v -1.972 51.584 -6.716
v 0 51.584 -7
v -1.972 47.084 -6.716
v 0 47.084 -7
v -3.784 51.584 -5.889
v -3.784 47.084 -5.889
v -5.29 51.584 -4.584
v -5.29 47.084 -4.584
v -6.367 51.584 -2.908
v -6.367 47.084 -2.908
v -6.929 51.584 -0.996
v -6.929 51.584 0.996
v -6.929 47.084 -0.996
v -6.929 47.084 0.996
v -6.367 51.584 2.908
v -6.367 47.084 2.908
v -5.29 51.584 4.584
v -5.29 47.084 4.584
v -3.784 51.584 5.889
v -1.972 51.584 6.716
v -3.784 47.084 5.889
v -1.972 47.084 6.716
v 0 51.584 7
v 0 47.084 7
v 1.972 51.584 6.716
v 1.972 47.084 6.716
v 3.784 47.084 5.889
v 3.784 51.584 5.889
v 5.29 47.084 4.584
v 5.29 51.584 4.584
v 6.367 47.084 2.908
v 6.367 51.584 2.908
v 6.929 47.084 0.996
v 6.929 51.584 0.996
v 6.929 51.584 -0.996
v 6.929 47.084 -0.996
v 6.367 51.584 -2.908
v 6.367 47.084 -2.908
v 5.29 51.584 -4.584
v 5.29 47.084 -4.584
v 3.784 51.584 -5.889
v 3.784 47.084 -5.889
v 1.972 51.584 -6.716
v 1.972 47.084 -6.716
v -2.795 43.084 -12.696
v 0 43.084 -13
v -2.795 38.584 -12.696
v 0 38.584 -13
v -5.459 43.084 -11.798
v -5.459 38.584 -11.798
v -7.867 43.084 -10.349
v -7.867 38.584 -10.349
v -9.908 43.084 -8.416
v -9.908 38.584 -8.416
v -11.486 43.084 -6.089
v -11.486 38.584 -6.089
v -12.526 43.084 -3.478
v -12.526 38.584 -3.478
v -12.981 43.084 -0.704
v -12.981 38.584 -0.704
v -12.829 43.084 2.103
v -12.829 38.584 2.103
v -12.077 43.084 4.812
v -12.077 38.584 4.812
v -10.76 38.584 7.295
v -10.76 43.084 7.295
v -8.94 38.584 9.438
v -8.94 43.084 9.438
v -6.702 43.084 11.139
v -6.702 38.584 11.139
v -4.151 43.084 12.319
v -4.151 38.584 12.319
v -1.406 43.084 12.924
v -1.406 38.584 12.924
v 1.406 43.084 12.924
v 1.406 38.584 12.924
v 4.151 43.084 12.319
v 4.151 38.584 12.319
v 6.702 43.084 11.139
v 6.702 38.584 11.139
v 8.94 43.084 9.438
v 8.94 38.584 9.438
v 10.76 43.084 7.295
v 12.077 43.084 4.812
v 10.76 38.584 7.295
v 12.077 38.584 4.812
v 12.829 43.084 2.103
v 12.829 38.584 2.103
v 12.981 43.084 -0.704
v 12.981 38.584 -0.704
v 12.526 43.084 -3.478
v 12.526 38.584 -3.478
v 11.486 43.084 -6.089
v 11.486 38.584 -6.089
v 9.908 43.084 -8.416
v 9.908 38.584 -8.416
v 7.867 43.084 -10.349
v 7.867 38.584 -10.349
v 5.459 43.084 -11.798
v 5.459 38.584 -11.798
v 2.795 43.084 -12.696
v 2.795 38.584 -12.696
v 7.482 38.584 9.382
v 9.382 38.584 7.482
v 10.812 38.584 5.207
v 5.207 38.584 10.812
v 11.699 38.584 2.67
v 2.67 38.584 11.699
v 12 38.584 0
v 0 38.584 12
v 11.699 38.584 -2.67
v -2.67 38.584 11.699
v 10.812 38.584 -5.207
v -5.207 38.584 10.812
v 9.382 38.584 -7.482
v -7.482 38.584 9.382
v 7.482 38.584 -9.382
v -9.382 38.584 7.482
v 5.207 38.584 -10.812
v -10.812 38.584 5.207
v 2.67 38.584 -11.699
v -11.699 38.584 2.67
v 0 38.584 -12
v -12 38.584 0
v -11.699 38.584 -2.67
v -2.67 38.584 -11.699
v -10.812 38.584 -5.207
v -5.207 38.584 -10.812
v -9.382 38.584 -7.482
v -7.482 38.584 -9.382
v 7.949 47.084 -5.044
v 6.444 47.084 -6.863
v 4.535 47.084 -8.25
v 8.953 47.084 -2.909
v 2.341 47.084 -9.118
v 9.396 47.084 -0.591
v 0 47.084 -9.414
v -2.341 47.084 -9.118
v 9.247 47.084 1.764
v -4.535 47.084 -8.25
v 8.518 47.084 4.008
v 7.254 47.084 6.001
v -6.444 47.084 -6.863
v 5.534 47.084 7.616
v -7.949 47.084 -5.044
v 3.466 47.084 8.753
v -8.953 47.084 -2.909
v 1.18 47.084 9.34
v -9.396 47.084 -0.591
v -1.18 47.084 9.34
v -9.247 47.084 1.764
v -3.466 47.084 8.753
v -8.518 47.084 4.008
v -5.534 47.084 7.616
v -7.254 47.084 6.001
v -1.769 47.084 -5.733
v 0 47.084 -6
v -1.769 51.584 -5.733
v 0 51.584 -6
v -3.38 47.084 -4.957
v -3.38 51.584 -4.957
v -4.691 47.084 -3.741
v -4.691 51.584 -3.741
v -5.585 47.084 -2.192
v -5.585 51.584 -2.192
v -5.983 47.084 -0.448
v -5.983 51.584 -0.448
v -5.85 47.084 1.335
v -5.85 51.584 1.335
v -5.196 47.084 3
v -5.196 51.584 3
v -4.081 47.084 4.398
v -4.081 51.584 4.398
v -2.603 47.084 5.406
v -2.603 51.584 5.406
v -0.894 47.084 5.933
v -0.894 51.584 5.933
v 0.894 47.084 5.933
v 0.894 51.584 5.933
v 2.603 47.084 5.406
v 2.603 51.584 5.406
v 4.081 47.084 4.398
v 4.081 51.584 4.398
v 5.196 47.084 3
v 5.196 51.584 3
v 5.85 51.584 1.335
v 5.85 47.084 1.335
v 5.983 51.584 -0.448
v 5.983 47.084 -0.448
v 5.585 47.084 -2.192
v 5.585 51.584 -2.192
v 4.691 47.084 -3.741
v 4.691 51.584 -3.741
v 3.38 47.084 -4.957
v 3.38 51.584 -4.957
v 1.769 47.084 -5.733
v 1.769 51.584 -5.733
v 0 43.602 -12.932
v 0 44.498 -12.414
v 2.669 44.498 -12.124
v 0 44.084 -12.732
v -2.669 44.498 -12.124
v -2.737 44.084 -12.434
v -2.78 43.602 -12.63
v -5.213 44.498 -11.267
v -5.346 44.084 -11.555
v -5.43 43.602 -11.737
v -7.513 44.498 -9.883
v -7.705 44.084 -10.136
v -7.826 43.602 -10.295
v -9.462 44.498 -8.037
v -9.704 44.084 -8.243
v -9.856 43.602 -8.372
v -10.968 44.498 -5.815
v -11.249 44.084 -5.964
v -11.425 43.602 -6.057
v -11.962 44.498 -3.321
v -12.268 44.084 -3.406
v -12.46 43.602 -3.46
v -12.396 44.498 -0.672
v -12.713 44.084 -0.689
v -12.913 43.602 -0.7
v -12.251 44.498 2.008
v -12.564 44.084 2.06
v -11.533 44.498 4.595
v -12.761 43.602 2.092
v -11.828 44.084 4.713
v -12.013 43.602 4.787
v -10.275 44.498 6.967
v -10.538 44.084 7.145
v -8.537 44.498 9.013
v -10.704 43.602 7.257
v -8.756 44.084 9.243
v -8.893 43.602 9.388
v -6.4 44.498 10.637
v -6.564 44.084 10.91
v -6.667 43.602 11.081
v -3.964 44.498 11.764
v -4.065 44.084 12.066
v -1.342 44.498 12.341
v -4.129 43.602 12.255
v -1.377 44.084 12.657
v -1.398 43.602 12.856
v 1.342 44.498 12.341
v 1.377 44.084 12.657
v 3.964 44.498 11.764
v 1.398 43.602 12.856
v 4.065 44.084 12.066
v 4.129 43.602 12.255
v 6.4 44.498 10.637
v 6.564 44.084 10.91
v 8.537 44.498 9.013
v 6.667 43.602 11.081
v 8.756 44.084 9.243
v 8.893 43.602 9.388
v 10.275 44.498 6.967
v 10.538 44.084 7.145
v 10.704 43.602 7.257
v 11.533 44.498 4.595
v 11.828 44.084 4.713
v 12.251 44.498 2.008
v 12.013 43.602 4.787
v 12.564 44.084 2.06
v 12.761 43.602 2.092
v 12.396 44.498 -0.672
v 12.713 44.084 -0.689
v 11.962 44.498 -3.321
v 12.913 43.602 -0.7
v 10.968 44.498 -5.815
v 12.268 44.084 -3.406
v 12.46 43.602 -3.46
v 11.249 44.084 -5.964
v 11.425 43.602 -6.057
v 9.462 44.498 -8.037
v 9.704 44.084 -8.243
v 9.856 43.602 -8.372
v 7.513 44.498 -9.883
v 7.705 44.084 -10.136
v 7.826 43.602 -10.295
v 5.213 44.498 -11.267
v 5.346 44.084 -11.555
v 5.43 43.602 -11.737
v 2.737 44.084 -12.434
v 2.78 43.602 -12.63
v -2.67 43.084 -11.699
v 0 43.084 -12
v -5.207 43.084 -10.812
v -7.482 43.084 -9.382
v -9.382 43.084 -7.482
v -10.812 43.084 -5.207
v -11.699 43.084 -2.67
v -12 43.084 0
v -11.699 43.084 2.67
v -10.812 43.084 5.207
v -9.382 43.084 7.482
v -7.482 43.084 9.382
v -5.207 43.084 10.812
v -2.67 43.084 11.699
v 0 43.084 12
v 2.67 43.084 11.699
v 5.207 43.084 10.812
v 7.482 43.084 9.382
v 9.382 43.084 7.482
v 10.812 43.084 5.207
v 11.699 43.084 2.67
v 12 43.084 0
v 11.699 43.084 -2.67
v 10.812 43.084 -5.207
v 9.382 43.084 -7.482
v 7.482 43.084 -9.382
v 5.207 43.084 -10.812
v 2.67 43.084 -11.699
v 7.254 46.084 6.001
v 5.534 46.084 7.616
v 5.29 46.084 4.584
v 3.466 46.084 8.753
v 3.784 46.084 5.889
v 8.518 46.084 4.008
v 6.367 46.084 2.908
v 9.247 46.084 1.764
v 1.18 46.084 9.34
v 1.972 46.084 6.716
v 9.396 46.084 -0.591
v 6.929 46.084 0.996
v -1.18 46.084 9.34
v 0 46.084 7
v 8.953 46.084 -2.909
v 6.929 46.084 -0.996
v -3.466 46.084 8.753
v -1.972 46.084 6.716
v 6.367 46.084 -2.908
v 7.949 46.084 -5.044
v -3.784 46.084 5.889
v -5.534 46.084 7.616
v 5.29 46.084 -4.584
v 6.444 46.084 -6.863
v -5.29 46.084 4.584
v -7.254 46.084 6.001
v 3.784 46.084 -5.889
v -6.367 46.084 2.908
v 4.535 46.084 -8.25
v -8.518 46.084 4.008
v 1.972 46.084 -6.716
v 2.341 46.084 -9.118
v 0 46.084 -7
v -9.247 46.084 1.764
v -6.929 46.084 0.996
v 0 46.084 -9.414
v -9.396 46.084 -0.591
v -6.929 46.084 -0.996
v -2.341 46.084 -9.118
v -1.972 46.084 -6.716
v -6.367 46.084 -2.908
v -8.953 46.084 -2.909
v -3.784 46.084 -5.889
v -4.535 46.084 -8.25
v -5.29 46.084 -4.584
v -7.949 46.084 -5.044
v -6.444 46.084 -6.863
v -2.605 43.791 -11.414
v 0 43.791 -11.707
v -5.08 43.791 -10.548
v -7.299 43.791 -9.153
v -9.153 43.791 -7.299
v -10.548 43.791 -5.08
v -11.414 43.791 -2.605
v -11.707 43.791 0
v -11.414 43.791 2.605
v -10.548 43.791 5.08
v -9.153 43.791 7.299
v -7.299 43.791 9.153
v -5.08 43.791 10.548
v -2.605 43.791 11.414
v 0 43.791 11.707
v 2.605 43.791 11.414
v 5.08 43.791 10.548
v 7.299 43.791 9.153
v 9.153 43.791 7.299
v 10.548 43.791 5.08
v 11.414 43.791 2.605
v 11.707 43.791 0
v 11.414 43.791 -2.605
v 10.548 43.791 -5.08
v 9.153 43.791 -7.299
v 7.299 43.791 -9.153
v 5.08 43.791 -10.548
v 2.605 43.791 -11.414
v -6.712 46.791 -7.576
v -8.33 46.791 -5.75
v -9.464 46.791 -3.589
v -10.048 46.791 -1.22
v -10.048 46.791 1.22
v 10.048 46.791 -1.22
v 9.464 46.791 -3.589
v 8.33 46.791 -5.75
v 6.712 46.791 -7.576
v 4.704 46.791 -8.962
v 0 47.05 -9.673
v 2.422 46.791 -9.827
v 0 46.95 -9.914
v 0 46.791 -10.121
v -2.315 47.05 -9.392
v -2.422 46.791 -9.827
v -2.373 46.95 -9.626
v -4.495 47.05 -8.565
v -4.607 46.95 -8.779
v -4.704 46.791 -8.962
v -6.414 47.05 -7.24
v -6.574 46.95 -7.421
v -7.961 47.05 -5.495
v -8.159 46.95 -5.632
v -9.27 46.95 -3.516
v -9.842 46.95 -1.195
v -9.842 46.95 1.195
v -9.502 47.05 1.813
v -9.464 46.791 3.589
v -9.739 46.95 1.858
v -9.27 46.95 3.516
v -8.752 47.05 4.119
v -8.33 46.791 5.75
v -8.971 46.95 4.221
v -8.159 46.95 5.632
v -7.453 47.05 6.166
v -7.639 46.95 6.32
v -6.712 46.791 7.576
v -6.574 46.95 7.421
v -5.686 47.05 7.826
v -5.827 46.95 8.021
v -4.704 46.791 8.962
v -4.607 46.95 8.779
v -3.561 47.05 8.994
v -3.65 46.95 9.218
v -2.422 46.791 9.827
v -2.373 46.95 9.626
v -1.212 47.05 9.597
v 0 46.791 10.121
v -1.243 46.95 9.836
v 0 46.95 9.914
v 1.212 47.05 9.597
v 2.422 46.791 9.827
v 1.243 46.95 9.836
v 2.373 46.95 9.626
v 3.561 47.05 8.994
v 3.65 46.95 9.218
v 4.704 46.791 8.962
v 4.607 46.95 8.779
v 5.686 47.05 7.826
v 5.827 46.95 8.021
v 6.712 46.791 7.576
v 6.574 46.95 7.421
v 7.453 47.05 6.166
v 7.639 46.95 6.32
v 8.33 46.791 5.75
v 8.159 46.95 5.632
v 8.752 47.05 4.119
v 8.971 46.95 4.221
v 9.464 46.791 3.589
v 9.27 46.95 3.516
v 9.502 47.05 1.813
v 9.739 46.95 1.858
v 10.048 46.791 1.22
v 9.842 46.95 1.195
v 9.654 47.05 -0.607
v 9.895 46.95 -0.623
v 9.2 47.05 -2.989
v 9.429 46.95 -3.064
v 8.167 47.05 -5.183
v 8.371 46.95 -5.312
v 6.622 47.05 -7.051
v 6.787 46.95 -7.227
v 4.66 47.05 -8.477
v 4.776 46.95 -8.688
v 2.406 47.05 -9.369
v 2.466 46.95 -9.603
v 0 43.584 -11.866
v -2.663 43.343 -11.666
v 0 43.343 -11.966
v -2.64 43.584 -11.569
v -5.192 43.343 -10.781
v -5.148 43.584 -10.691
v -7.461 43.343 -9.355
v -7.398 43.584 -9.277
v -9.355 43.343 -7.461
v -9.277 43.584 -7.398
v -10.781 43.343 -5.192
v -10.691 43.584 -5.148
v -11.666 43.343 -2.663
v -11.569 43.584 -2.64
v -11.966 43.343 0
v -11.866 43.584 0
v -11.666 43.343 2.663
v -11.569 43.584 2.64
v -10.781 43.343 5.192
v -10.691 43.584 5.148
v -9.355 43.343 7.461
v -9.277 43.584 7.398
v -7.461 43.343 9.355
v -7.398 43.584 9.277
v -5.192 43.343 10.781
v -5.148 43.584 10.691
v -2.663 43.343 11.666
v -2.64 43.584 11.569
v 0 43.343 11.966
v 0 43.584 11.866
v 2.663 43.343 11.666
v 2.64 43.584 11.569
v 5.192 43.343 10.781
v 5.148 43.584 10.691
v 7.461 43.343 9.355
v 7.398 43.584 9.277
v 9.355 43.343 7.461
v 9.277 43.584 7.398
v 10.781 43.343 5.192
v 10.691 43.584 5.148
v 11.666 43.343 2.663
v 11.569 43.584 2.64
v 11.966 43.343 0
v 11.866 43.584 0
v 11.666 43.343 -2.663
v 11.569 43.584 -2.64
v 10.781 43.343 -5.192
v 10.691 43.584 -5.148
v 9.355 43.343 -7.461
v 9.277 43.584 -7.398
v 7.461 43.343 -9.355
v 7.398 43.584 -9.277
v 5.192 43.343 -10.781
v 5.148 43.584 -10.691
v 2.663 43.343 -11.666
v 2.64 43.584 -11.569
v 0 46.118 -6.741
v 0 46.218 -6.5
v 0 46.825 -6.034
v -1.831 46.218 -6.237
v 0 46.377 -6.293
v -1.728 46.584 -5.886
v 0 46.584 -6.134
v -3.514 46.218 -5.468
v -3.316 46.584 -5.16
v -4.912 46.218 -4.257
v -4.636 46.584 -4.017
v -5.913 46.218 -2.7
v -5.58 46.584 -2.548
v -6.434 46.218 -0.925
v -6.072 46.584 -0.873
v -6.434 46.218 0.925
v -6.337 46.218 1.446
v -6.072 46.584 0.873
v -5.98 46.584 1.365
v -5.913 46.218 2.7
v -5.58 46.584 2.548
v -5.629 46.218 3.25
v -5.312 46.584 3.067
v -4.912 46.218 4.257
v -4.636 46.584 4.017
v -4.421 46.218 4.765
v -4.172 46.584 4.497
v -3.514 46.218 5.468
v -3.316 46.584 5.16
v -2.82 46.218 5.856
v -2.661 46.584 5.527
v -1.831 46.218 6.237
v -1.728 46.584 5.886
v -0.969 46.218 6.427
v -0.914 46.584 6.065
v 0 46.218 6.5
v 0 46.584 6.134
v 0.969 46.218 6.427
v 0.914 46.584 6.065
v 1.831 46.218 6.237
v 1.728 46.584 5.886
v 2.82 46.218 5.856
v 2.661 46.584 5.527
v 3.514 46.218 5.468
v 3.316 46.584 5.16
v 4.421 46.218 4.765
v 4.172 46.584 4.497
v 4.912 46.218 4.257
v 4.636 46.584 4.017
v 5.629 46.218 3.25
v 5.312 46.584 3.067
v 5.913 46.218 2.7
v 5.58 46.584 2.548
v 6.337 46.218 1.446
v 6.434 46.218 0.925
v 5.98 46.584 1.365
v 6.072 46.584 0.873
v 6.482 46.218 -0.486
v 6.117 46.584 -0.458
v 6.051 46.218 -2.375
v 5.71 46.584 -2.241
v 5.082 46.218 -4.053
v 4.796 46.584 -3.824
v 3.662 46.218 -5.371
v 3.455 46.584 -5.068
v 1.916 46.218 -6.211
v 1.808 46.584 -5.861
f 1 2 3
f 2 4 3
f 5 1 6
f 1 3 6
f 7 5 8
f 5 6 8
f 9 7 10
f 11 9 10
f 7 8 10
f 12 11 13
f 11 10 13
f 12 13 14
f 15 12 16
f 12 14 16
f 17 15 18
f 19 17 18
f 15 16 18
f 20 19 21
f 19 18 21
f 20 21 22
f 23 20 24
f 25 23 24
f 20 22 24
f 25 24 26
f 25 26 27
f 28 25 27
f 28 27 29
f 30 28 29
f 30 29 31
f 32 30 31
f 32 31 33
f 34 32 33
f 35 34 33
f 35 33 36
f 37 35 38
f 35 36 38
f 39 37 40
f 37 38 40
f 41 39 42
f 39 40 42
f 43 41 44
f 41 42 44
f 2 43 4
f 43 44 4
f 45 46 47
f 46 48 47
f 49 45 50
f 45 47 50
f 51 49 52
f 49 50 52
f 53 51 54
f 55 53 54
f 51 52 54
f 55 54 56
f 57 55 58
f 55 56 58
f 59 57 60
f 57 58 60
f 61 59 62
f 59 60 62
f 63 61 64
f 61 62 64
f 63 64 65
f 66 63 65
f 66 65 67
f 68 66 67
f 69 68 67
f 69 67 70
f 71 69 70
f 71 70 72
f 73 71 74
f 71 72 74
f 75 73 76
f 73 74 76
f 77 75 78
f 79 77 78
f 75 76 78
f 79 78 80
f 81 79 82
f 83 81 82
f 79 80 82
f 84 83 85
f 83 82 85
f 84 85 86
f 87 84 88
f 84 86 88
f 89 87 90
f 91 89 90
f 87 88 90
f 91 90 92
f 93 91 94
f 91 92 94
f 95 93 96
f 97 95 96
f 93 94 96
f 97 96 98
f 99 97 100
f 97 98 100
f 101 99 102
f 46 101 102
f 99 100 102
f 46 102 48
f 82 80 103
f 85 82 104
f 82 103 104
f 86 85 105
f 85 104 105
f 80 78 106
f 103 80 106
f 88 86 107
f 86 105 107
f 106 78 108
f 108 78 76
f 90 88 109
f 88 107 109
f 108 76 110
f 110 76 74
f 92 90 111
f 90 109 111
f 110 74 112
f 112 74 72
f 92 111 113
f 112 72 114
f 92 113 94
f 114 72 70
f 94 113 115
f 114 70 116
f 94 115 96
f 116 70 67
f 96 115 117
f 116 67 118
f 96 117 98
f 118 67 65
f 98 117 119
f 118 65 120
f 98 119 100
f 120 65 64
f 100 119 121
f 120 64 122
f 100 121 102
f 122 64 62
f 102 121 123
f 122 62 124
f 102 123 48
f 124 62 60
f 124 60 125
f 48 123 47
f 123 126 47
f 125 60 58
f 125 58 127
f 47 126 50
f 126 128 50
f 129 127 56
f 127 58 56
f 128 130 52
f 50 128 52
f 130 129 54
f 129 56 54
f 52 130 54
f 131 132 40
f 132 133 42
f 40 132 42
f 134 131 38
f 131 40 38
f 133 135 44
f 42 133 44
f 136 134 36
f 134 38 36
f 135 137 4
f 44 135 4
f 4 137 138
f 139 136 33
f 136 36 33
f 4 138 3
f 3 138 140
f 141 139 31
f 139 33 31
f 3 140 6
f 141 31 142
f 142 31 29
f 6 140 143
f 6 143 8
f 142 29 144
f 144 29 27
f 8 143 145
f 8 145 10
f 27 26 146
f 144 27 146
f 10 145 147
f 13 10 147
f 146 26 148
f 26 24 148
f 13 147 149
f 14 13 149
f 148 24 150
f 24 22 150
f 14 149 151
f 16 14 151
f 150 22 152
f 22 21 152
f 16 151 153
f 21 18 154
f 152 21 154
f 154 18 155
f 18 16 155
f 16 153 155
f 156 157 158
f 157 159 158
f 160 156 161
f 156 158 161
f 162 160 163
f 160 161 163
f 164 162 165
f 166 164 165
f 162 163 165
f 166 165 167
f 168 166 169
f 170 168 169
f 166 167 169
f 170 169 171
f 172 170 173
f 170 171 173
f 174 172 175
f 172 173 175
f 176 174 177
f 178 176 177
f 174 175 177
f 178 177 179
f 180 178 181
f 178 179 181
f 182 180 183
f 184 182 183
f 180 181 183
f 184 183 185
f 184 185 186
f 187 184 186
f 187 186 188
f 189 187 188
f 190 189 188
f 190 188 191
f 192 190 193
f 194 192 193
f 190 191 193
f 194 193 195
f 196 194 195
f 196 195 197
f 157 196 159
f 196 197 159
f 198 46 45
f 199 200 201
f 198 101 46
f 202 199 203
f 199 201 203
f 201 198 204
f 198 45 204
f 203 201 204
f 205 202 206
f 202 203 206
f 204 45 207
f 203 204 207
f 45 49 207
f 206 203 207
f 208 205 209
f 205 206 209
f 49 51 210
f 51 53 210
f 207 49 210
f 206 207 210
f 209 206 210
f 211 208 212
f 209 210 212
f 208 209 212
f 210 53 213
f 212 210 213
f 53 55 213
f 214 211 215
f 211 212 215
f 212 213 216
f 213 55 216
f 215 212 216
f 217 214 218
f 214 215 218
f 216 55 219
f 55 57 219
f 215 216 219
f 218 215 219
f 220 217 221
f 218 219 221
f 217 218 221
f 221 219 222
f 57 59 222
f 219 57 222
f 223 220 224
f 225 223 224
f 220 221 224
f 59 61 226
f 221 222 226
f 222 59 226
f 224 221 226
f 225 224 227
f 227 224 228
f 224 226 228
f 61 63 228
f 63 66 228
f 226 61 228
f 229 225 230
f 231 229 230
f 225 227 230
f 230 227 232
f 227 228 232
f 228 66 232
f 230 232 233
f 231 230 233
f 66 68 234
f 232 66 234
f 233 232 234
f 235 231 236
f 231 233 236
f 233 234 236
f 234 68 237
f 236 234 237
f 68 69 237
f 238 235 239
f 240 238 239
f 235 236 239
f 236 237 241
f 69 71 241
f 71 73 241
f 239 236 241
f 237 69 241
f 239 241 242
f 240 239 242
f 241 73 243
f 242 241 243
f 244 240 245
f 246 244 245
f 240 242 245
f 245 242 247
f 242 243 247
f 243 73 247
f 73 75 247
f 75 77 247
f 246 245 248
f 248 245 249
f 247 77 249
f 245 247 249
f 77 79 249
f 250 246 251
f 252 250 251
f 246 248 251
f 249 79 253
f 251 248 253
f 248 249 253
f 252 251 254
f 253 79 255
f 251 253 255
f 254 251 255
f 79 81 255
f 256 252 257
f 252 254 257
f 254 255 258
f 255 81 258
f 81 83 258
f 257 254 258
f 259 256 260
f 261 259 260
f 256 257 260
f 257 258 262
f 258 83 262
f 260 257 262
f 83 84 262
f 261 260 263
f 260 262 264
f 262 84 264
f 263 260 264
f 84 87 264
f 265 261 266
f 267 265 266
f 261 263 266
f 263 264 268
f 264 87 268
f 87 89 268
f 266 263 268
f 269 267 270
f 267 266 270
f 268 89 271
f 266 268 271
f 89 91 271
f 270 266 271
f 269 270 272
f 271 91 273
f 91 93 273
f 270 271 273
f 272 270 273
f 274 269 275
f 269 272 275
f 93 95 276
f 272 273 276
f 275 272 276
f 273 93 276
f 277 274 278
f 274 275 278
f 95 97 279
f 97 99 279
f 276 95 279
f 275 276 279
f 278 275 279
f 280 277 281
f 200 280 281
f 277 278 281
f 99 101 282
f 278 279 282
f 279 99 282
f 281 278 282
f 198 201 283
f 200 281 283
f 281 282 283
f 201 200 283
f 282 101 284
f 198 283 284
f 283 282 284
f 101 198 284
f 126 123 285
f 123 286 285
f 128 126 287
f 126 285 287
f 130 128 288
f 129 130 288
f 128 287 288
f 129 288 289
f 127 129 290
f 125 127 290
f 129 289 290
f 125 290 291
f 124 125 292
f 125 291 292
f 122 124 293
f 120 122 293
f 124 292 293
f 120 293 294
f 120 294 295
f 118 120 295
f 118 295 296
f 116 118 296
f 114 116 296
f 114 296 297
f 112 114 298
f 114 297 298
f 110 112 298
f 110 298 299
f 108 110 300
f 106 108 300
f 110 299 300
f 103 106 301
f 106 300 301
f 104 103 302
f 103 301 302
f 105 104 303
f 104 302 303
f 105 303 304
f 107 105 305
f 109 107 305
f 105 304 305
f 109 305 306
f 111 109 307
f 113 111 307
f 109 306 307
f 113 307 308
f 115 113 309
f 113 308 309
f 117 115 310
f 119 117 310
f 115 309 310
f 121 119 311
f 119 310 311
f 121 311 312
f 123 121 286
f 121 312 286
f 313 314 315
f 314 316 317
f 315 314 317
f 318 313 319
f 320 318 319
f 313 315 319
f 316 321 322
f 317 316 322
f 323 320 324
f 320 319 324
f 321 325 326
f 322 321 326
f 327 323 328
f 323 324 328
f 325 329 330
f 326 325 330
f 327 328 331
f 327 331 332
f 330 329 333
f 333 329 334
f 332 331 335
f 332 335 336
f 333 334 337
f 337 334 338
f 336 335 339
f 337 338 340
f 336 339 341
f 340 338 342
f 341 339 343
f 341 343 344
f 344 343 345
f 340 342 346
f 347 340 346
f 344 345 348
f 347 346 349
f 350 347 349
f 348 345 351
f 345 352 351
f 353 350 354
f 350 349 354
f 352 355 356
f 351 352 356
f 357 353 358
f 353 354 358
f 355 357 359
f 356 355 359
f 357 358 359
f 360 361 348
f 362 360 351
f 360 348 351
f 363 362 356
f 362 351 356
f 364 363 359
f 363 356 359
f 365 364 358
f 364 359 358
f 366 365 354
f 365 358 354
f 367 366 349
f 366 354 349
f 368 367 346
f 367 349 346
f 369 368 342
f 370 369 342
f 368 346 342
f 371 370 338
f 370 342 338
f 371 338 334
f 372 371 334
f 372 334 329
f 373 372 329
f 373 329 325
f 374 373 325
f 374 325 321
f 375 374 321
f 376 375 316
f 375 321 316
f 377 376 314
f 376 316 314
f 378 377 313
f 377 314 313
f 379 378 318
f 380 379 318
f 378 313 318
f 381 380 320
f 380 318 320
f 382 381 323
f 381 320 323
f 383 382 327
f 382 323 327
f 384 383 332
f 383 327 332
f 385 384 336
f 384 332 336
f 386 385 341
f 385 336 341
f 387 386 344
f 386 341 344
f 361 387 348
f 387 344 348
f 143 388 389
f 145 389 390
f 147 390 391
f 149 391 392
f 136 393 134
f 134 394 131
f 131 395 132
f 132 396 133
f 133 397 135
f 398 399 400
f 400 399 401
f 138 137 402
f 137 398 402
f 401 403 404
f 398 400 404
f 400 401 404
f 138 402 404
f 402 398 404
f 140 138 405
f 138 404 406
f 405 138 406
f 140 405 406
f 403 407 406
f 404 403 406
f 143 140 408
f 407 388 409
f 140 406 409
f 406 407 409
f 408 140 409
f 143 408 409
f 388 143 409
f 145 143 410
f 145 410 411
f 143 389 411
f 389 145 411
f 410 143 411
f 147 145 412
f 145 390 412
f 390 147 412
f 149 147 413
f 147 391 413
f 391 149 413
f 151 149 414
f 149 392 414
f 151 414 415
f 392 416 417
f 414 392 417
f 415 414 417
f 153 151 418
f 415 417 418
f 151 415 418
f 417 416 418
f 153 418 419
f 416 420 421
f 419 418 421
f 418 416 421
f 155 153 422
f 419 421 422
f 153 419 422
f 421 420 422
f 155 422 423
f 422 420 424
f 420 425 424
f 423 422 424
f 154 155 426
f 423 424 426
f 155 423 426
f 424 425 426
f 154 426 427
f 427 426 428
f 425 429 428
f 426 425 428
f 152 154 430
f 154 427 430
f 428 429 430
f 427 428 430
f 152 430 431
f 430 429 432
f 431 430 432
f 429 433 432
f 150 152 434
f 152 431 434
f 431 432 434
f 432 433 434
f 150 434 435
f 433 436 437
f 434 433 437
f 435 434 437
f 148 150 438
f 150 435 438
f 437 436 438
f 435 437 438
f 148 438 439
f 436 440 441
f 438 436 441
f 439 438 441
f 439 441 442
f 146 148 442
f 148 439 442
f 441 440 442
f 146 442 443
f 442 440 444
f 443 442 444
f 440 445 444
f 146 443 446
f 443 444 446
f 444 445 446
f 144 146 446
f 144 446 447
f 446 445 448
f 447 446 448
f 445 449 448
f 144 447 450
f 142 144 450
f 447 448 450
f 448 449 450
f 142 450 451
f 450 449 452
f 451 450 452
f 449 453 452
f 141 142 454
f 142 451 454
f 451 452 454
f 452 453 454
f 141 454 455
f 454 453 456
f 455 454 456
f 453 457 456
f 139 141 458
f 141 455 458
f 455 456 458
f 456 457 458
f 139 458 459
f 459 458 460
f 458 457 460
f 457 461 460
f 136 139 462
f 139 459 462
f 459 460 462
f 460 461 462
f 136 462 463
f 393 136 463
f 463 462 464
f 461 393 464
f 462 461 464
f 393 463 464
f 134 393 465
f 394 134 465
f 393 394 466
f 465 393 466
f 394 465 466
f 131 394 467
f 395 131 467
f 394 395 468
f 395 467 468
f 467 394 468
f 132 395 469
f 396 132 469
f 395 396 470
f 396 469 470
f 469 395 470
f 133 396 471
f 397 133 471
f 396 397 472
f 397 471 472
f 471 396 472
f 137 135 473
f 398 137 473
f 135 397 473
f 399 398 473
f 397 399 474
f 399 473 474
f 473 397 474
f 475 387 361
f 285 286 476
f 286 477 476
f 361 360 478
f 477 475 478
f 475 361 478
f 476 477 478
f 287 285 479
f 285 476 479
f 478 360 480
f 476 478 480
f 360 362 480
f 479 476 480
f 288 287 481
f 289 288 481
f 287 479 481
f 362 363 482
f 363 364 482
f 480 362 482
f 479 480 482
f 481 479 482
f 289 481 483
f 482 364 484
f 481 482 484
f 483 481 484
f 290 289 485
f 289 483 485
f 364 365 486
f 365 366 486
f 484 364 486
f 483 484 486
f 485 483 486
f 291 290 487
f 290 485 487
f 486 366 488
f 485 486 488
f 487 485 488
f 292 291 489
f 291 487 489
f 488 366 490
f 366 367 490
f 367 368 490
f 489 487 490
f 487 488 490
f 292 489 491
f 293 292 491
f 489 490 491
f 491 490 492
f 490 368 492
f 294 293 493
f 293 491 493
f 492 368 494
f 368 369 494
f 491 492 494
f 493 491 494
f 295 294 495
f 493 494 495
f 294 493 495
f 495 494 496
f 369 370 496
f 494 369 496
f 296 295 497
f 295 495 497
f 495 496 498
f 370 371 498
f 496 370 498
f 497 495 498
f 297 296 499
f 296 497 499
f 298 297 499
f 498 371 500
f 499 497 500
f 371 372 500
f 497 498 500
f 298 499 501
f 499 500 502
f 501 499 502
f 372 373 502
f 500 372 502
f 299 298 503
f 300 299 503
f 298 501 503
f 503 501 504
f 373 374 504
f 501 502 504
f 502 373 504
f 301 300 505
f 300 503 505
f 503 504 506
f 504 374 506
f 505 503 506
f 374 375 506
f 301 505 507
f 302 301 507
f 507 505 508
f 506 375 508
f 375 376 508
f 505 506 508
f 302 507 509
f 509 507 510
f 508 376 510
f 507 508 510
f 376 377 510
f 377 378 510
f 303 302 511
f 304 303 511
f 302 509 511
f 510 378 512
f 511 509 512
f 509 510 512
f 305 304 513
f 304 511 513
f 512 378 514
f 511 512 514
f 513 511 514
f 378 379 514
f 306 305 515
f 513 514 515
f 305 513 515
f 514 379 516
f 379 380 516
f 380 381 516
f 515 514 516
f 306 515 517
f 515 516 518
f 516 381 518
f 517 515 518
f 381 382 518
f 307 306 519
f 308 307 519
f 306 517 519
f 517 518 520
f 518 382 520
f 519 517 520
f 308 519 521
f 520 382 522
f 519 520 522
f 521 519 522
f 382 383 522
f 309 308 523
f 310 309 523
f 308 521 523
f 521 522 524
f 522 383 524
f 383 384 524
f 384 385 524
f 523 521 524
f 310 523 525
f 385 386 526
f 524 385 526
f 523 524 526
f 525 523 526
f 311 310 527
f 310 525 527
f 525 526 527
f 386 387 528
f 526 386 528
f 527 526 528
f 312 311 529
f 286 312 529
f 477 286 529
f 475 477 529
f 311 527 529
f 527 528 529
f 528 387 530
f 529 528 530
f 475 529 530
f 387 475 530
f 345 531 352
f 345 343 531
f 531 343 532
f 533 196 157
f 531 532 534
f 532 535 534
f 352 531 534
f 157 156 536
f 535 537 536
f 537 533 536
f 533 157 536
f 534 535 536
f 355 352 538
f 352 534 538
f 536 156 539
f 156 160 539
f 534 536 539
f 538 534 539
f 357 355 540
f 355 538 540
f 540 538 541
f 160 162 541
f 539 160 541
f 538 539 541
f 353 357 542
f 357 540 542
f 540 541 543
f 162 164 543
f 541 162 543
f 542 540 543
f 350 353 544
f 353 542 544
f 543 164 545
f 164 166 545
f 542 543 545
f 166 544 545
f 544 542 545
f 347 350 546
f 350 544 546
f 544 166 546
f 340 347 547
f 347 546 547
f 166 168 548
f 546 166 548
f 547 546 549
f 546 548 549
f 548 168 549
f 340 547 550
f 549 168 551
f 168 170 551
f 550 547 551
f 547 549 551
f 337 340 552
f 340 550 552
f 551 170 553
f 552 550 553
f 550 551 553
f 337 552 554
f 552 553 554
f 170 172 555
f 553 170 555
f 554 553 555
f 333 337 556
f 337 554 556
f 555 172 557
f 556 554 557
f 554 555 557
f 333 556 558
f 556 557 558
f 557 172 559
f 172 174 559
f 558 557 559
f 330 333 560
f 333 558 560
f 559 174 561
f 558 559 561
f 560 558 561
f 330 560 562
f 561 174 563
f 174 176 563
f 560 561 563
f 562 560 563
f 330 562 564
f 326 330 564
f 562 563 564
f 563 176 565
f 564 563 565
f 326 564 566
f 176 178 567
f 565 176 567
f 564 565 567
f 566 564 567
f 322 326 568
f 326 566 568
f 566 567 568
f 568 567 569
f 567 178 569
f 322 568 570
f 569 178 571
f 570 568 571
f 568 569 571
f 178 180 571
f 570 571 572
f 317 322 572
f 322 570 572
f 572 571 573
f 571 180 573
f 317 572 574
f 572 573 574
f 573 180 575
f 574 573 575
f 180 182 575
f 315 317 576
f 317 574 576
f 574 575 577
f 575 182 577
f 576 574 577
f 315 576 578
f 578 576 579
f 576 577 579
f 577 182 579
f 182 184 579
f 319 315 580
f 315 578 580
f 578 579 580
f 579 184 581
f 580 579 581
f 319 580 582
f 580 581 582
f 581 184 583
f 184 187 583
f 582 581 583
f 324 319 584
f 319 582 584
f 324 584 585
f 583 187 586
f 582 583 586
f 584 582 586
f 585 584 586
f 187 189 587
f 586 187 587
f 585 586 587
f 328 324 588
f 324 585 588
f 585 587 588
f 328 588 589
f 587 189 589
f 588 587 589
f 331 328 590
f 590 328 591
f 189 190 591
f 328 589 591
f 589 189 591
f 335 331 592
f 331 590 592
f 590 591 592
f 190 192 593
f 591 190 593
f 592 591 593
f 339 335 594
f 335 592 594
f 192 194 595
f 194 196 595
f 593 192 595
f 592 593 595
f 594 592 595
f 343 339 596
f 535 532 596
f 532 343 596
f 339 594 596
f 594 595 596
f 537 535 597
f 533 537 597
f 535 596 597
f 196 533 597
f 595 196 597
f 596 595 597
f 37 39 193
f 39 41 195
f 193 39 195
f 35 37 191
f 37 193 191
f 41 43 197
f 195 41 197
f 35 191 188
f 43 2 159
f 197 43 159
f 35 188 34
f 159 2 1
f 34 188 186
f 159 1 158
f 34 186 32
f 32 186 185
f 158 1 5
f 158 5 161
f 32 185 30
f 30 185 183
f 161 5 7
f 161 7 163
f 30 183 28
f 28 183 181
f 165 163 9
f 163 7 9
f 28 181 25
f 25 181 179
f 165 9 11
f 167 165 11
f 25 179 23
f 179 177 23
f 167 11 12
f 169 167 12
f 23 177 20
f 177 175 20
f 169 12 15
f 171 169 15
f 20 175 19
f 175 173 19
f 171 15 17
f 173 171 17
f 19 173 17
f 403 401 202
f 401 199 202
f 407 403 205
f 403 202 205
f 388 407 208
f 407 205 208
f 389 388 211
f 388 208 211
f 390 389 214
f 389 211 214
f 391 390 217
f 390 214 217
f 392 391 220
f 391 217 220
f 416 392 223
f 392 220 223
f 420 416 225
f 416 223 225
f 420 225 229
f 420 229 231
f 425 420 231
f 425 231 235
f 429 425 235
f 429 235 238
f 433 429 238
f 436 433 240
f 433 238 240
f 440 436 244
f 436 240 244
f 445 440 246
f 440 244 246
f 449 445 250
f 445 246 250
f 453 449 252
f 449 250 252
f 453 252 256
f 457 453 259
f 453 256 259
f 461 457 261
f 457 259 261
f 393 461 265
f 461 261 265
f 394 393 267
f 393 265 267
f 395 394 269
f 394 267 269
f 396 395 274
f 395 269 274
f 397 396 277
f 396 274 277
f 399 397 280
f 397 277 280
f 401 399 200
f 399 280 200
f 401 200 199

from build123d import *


with BuildPart() as part:
    # Esquisse1 → Révolution1 (revolve)
    with BuildSketch(Plane.XY, mode=Mode.PRIVATE) as r_volution1_sk:
        with BuildLine():
            Line((7, 51.583866339), (7, 47.083866339))
            Line((7, 47.083866339), (9.414213562, 47.083866339))
            ThreePointArc((9.414213562, 47.083866339), (9.796896995, 47.007745871), (10.121320344, 46.79097312))
            Line((10.121320344, 46.79097312), (12.414213562, 44.498079901))
            ThreePointArc((12.414213562, 44.498079901), (12.847759065, 43.849233203), (13, 43.083866339))
            Line((13, 43.083866339), (13, 38.583866339))
            Line((13, 38.583866339), (12, 38.583866339))
            Line((12, 38.583866339), (12, 43.083866339))
            ThreePointArc((12, 43.083866339), (11.923879533, 43.466549771), (11.707106781, 43.79097312))
            Line((11.707106781, 43.79097312), (9.414213562, 46.083866339))
            Line((9.414213562, 46.083866339), (7, 46.083866339))
            ThreePointArc((7, 46.083866339), (6.292893219, 46.376759557), (6, 47.083866339))
            Line((6, 47.083866339), (6, 51.583866339))
            Line((6, 51.583866339), (7, 51.583866339))
        make_face()
    revolve(r_volution1_sk.sketch.rotate(Axis((0, 0, 0), (0, 1, 0)), 90), axis=Axis((0, 0, 0), (0, 1, 0)))


solid = part.part
